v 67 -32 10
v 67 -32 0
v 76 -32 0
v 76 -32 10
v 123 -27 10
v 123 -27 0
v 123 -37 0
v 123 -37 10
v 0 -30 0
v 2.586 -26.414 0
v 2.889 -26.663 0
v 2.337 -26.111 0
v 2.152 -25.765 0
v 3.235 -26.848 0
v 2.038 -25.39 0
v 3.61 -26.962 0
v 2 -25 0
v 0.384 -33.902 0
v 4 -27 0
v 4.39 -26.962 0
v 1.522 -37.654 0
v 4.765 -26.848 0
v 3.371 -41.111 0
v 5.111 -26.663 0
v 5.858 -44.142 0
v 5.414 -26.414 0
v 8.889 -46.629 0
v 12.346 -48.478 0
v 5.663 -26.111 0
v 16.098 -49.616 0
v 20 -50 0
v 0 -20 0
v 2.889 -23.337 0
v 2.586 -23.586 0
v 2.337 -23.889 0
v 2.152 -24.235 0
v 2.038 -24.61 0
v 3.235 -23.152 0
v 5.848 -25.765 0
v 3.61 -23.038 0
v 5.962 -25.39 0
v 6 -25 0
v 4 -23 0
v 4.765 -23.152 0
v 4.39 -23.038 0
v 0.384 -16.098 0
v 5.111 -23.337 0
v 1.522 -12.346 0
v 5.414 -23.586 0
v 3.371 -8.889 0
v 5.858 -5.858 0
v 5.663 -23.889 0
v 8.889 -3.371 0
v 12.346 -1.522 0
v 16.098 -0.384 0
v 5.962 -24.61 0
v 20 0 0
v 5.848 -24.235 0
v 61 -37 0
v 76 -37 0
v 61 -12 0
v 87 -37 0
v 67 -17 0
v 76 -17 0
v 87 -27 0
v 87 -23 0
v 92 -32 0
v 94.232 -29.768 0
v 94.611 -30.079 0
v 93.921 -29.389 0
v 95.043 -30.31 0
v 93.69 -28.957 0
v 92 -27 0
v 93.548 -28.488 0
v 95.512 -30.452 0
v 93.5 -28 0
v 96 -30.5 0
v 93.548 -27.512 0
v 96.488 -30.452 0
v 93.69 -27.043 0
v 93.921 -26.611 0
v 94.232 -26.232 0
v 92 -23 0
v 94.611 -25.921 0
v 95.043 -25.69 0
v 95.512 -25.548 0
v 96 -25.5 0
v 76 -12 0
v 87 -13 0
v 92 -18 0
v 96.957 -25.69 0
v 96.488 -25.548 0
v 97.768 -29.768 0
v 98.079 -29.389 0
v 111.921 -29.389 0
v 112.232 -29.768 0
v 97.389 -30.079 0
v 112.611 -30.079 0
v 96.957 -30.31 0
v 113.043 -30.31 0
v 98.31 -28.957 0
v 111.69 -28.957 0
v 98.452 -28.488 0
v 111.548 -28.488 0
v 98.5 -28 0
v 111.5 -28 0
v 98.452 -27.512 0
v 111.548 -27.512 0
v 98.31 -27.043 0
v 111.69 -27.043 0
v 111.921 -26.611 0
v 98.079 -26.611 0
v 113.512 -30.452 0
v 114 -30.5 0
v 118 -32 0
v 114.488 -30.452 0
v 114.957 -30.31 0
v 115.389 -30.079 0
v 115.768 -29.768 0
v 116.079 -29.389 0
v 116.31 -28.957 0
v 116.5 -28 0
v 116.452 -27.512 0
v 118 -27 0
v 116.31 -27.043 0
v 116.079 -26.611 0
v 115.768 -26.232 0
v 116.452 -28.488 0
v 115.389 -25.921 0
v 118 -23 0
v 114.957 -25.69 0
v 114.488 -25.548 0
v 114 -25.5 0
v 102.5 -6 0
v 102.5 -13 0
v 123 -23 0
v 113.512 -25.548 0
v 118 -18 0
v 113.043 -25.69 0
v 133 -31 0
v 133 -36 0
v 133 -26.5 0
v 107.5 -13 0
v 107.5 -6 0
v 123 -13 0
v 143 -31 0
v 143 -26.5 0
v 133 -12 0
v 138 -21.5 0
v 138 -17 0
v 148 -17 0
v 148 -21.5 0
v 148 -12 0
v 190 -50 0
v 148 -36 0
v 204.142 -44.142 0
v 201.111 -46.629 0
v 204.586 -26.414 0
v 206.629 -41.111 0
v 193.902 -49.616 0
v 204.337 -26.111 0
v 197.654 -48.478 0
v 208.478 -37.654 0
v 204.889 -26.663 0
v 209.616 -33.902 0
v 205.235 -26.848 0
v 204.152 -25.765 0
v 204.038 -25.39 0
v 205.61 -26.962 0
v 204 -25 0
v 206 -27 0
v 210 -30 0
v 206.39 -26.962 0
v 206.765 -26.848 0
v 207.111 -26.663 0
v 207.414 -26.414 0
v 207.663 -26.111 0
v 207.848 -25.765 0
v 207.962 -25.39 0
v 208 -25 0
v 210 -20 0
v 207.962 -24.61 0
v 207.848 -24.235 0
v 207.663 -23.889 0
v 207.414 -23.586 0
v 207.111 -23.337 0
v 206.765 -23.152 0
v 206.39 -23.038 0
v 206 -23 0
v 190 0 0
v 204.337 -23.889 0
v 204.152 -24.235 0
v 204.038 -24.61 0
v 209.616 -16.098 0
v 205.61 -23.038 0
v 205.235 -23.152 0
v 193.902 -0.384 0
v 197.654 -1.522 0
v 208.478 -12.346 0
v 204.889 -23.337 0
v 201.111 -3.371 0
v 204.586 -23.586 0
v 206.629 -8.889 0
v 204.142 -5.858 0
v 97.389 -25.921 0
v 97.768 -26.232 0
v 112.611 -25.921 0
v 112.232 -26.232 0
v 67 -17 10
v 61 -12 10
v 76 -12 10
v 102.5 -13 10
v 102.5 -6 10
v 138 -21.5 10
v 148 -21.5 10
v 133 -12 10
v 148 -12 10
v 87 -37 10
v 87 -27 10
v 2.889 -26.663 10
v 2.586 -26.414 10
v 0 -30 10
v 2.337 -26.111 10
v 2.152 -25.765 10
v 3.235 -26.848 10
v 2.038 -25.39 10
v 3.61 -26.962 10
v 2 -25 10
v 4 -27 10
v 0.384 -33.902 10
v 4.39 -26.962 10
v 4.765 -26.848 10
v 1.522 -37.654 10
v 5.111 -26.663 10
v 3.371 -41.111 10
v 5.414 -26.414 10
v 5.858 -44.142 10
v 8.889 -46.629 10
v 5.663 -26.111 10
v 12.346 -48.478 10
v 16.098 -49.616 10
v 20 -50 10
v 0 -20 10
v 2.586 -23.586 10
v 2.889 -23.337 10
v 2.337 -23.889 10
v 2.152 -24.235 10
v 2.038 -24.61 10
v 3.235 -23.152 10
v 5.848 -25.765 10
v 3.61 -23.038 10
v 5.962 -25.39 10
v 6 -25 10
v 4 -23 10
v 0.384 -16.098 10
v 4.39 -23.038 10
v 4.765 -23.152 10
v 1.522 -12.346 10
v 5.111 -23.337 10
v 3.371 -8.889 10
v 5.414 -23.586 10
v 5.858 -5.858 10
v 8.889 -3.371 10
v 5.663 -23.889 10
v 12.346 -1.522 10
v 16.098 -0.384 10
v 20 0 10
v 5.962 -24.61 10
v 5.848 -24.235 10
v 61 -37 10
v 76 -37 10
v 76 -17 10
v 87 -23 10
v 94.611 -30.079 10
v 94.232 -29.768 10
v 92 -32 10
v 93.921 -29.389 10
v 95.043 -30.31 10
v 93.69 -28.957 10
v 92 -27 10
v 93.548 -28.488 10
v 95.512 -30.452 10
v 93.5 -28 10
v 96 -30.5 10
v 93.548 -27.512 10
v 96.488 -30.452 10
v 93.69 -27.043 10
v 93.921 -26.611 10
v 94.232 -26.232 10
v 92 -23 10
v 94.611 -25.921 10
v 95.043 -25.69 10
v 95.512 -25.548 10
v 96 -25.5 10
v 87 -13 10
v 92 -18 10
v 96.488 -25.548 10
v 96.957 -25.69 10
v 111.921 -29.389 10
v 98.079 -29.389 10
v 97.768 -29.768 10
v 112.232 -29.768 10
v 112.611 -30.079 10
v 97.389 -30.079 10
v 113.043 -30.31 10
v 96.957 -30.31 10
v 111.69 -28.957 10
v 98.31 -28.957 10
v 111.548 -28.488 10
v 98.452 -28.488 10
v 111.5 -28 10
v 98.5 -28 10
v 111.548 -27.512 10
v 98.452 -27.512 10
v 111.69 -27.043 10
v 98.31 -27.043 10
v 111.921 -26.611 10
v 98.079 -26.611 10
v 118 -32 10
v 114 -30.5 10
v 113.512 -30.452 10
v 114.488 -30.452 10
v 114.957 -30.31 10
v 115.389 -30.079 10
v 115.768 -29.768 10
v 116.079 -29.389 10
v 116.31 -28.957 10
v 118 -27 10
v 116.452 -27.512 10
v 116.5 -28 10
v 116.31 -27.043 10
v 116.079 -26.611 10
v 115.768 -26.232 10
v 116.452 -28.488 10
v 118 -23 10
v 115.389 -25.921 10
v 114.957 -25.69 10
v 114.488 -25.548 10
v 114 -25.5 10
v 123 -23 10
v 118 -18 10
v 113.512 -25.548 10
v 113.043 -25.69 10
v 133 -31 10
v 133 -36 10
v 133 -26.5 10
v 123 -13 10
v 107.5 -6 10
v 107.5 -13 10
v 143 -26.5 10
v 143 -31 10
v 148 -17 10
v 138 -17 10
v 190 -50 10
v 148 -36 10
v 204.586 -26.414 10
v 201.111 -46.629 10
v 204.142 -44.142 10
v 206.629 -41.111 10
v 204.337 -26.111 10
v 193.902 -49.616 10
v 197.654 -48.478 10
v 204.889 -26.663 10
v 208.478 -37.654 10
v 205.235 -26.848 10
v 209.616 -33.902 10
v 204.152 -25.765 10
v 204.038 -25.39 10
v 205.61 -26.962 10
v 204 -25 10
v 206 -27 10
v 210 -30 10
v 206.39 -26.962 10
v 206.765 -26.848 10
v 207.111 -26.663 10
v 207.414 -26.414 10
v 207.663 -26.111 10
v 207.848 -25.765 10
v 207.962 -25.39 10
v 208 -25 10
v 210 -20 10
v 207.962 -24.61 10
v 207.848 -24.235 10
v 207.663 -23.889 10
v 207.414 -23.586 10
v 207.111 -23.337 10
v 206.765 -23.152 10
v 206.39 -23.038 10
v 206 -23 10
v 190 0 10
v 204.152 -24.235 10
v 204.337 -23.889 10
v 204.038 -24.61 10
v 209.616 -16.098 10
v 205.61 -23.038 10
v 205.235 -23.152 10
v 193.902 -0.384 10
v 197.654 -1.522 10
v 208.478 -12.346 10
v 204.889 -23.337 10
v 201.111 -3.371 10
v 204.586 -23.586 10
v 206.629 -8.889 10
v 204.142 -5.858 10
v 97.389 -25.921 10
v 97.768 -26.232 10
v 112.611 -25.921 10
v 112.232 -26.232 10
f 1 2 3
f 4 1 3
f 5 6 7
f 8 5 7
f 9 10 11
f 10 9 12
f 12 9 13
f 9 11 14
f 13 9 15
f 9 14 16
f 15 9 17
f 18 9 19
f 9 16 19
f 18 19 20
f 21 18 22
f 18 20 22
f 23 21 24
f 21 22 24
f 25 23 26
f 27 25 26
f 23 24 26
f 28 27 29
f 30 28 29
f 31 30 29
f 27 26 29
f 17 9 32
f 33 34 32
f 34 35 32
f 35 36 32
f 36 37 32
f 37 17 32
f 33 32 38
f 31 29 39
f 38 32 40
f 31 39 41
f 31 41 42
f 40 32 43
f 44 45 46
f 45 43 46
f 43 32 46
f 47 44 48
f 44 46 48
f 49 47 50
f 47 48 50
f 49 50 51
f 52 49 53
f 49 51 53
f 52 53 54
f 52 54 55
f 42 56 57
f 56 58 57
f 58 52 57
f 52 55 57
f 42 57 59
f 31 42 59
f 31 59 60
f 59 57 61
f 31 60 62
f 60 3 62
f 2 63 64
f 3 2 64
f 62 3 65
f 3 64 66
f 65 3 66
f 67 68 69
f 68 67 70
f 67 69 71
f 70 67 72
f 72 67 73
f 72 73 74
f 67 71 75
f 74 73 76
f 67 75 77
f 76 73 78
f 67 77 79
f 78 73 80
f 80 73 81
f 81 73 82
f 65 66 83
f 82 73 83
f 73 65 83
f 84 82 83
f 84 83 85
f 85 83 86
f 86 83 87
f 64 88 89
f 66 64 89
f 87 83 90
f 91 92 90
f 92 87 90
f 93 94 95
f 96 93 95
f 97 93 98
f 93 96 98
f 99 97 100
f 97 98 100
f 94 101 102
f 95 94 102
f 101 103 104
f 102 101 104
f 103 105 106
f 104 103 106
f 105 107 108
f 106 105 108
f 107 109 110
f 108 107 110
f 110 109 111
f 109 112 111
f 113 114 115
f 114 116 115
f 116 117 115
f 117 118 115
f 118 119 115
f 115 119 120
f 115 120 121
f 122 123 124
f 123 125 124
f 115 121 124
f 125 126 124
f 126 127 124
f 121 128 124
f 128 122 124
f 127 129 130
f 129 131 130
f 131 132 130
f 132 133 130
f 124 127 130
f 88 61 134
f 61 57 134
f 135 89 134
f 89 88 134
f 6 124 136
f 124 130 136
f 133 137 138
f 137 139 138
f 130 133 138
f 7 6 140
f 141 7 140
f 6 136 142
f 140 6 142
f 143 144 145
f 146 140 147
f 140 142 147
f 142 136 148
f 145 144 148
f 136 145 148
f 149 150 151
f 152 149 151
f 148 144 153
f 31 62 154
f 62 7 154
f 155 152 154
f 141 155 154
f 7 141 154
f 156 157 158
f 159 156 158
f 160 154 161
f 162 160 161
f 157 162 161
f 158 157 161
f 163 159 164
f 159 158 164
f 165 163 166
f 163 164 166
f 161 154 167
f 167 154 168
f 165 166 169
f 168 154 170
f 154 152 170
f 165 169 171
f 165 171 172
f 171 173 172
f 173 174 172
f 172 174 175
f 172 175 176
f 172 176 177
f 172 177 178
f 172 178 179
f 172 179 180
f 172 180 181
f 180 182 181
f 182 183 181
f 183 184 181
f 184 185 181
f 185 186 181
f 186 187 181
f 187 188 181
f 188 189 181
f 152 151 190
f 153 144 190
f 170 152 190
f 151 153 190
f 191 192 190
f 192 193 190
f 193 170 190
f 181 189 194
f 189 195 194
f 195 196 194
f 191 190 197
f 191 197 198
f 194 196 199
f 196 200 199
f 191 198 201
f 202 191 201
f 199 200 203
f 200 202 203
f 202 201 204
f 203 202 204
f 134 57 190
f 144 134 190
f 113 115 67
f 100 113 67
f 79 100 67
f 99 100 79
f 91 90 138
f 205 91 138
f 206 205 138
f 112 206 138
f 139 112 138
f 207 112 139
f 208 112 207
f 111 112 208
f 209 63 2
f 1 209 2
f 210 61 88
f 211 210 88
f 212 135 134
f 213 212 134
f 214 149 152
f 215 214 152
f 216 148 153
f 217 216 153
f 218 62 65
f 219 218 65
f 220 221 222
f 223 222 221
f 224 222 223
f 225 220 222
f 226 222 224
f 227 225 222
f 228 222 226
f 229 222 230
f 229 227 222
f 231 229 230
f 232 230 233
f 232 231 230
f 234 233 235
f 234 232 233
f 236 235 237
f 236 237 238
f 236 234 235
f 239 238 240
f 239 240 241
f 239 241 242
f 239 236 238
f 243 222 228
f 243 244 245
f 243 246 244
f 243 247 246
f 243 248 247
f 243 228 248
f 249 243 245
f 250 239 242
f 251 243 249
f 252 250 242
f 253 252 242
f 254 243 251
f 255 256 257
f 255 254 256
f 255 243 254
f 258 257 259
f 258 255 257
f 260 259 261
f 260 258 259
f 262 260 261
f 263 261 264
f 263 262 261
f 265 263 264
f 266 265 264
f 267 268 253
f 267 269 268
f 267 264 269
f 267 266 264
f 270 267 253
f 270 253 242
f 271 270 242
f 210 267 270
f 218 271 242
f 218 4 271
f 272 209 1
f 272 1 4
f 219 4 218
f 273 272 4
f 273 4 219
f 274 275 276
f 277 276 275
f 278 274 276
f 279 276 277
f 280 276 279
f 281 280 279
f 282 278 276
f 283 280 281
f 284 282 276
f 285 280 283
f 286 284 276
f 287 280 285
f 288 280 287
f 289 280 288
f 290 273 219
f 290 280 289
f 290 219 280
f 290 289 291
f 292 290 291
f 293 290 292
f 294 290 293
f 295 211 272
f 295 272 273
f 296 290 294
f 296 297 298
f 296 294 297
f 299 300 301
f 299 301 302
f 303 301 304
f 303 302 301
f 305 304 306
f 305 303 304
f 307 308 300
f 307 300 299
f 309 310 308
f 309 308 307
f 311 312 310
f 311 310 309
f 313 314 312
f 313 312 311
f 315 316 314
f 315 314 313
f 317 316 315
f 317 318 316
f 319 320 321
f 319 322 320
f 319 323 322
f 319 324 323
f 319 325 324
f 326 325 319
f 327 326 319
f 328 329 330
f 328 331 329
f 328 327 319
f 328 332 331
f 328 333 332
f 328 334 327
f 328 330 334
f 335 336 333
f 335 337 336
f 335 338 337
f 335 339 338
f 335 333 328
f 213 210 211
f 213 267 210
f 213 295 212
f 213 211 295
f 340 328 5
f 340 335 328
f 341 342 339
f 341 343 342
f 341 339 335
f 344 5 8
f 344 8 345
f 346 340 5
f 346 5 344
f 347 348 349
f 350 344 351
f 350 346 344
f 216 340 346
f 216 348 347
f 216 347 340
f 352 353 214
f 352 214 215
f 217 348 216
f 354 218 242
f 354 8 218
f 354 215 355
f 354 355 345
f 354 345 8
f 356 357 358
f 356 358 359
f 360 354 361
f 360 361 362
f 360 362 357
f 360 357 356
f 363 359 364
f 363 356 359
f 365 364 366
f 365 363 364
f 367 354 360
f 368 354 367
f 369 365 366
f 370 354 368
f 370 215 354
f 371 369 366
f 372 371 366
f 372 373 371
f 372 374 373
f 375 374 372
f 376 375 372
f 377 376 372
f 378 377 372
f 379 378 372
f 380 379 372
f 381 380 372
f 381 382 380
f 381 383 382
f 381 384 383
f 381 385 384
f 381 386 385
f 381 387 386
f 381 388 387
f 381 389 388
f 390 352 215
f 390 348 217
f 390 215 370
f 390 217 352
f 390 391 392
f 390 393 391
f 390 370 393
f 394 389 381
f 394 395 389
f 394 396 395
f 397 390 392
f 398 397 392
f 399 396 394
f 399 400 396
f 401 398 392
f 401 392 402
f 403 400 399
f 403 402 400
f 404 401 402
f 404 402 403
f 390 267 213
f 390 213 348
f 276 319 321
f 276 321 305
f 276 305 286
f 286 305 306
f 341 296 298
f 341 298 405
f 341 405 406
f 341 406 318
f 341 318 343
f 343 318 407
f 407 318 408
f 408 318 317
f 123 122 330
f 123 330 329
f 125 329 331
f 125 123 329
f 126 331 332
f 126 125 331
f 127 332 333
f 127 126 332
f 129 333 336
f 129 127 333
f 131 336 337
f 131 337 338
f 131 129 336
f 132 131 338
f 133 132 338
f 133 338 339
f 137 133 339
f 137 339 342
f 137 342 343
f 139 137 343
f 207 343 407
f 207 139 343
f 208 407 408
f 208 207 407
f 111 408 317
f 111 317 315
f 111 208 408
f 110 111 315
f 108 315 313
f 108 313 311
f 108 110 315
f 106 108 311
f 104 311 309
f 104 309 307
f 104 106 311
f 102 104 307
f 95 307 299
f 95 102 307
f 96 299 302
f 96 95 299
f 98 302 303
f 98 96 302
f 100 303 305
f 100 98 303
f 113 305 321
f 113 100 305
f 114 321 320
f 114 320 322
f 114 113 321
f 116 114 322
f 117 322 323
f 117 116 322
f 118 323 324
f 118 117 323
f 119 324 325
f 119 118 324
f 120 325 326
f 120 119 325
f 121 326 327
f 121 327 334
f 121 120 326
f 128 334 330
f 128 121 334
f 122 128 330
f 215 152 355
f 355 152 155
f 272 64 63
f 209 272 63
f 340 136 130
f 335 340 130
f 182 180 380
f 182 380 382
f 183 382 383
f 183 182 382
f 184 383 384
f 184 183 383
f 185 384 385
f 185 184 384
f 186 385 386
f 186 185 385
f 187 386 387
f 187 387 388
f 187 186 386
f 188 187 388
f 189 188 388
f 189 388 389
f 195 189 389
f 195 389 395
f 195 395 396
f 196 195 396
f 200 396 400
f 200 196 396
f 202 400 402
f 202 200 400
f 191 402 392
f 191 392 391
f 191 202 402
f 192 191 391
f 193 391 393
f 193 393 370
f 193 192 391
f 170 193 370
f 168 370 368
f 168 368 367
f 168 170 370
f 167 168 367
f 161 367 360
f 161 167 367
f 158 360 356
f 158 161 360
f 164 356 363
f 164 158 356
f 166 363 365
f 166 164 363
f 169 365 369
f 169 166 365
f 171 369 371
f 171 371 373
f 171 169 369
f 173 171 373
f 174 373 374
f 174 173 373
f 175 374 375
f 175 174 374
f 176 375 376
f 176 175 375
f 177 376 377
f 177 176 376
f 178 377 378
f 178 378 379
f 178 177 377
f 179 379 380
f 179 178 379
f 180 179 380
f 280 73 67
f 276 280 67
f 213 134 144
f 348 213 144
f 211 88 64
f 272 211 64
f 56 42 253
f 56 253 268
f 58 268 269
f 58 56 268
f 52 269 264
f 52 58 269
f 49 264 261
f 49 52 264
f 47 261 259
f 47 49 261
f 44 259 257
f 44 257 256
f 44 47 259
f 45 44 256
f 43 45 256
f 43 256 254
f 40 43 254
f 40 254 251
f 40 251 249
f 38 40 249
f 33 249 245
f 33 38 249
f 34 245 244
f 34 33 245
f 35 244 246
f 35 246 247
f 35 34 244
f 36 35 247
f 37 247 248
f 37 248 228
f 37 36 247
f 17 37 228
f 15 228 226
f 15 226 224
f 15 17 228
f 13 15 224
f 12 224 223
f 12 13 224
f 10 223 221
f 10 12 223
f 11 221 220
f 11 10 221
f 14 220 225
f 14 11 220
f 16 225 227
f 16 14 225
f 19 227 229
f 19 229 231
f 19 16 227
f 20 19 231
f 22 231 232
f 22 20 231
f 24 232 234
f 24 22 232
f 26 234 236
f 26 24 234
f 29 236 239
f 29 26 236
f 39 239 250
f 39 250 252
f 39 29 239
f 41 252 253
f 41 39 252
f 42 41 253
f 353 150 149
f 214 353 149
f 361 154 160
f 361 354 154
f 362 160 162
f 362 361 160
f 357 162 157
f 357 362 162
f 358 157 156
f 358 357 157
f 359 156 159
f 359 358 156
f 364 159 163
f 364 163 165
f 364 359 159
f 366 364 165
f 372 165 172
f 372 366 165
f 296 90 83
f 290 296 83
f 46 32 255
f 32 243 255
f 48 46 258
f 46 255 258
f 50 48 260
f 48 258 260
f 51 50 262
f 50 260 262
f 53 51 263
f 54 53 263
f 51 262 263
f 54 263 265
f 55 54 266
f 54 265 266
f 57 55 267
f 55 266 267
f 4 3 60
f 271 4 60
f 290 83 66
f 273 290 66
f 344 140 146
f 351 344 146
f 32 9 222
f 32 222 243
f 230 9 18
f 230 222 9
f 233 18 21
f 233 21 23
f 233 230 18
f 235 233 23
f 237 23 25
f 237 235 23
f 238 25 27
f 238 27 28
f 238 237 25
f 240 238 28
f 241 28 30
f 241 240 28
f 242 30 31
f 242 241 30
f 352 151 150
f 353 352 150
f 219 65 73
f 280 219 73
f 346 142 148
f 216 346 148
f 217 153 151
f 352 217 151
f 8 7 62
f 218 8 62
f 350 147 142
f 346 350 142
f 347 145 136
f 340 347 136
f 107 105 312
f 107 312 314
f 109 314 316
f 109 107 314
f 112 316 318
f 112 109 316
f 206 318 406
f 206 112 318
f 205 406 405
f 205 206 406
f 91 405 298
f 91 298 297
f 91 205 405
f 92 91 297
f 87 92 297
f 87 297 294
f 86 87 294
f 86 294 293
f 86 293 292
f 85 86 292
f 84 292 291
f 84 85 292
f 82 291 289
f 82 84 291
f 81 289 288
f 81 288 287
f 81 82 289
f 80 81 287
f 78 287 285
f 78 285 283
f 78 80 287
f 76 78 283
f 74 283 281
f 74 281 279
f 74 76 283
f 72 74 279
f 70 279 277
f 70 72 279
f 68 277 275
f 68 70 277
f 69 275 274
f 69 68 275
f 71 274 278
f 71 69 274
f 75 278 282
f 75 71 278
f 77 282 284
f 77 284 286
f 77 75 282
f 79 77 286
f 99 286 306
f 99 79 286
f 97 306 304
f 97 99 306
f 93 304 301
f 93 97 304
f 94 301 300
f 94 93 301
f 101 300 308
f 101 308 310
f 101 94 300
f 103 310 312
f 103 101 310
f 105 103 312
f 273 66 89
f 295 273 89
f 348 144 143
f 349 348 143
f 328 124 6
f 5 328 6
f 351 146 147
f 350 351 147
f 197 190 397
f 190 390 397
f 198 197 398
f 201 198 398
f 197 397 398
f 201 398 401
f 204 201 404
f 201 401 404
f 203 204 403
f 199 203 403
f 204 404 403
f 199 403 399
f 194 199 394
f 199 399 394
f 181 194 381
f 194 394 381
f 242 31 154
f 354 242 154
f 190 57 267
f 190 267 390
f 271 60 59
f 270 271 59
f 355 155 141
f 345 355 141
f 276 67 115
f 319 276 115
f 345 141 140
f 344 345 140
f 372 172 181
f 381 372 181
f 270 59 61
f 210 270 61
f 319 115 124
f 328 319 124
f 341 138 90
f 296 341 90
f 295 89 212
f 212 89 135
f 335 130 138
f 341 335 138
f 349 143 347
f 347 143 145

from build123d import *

# Parameters (mm, degrees)
CROQUIS1_W              = 210
CROQUIS1_H              = 50
CROQUIS1_R              = 2.5
CROQUIS1_R_2            = 2
SALIENTE_EXTRUIR1_DEPTH = 10
REDONDEO1_R             = 20


with BuildPart() as part:
    # Croquis1 → Saliente-Extruir1 (new body)
    with BuildSketch(Plane.XY):
        with Locations((105, -25)):
            Rectangle(CROQUIS1_W, CROQUIS1_H)
        with Locations((96, -28)):
            Circle(CROQUIS1_R, mode=Mode.SUBTRACT)
        Polygon((118, -27), (123, -27), (123, -32), (123, -37), (118, -37), (92, -37), (87, -37), (87, -32), (87, -27), (92, -27), (92, -32), (118, -32), align=None, mode=Mode.SUBTRACT)
        with Locations((114, -28)):
            Circle(CROQUIS1_R, mode=Mode.SUBTRACT)
        with Locations((4, -25)):
            Circle(CROQUIS1_R_2, mode=Mode.SUBTRACT)
        Polygon((67, -12), (76, -12), (76, -17), (67, -17), (67, -32), (76, -32), (76, -37), (67, -37), (61, -37), (61, -32), (61, -17), (61, -12), align=None, mode=Mode.SUBTRACT)
        Polygon((138, -12), (148, -12), (148, -17), (138, -17), (138, -21.5), (143, -21.5), (148, -21.5), (148, -26.5), (148, -31), (148, -36), (133, -36), (133, -31), (143, -31), (143, -26.5), (138, -26.5), (133, -26.5), (133, -21.5), (133, -17), (133, -12), align=None, mode=Mode.SUBTRACT)
        Polygon((87, -18), (87, -13), (92, -13), (102.5, -13), (102.5, -6), (107.5, -6), (107.5, -13), (118, -13), (123, -13), (123, -18), (123, -23), (118, -23), (118, -18), (107.5, -18), (102.5, -18), (92, -18), (92, -23), (87, -23), align=None, mode=Mode.SUBTRACT)
        with Locations((206, -25)):
            Circle(CROQUIS1_R_2, mode=Mode.SUBTRACT)
    extrude(amount=SALIENTE_EXTRUIR1_DEPTH)

    # Redondeo1
    redondeo1_edges = [part.edges().sort_by_distance(p)[0] for p in [
        (210, -50, 5),
        (0, -50, 5),
        (0, 0, 5),
        (210, 0, 5),
    ]]
    fillet(redondeo1_edges, radius=REDONDEO1_R)


solid = part.part
